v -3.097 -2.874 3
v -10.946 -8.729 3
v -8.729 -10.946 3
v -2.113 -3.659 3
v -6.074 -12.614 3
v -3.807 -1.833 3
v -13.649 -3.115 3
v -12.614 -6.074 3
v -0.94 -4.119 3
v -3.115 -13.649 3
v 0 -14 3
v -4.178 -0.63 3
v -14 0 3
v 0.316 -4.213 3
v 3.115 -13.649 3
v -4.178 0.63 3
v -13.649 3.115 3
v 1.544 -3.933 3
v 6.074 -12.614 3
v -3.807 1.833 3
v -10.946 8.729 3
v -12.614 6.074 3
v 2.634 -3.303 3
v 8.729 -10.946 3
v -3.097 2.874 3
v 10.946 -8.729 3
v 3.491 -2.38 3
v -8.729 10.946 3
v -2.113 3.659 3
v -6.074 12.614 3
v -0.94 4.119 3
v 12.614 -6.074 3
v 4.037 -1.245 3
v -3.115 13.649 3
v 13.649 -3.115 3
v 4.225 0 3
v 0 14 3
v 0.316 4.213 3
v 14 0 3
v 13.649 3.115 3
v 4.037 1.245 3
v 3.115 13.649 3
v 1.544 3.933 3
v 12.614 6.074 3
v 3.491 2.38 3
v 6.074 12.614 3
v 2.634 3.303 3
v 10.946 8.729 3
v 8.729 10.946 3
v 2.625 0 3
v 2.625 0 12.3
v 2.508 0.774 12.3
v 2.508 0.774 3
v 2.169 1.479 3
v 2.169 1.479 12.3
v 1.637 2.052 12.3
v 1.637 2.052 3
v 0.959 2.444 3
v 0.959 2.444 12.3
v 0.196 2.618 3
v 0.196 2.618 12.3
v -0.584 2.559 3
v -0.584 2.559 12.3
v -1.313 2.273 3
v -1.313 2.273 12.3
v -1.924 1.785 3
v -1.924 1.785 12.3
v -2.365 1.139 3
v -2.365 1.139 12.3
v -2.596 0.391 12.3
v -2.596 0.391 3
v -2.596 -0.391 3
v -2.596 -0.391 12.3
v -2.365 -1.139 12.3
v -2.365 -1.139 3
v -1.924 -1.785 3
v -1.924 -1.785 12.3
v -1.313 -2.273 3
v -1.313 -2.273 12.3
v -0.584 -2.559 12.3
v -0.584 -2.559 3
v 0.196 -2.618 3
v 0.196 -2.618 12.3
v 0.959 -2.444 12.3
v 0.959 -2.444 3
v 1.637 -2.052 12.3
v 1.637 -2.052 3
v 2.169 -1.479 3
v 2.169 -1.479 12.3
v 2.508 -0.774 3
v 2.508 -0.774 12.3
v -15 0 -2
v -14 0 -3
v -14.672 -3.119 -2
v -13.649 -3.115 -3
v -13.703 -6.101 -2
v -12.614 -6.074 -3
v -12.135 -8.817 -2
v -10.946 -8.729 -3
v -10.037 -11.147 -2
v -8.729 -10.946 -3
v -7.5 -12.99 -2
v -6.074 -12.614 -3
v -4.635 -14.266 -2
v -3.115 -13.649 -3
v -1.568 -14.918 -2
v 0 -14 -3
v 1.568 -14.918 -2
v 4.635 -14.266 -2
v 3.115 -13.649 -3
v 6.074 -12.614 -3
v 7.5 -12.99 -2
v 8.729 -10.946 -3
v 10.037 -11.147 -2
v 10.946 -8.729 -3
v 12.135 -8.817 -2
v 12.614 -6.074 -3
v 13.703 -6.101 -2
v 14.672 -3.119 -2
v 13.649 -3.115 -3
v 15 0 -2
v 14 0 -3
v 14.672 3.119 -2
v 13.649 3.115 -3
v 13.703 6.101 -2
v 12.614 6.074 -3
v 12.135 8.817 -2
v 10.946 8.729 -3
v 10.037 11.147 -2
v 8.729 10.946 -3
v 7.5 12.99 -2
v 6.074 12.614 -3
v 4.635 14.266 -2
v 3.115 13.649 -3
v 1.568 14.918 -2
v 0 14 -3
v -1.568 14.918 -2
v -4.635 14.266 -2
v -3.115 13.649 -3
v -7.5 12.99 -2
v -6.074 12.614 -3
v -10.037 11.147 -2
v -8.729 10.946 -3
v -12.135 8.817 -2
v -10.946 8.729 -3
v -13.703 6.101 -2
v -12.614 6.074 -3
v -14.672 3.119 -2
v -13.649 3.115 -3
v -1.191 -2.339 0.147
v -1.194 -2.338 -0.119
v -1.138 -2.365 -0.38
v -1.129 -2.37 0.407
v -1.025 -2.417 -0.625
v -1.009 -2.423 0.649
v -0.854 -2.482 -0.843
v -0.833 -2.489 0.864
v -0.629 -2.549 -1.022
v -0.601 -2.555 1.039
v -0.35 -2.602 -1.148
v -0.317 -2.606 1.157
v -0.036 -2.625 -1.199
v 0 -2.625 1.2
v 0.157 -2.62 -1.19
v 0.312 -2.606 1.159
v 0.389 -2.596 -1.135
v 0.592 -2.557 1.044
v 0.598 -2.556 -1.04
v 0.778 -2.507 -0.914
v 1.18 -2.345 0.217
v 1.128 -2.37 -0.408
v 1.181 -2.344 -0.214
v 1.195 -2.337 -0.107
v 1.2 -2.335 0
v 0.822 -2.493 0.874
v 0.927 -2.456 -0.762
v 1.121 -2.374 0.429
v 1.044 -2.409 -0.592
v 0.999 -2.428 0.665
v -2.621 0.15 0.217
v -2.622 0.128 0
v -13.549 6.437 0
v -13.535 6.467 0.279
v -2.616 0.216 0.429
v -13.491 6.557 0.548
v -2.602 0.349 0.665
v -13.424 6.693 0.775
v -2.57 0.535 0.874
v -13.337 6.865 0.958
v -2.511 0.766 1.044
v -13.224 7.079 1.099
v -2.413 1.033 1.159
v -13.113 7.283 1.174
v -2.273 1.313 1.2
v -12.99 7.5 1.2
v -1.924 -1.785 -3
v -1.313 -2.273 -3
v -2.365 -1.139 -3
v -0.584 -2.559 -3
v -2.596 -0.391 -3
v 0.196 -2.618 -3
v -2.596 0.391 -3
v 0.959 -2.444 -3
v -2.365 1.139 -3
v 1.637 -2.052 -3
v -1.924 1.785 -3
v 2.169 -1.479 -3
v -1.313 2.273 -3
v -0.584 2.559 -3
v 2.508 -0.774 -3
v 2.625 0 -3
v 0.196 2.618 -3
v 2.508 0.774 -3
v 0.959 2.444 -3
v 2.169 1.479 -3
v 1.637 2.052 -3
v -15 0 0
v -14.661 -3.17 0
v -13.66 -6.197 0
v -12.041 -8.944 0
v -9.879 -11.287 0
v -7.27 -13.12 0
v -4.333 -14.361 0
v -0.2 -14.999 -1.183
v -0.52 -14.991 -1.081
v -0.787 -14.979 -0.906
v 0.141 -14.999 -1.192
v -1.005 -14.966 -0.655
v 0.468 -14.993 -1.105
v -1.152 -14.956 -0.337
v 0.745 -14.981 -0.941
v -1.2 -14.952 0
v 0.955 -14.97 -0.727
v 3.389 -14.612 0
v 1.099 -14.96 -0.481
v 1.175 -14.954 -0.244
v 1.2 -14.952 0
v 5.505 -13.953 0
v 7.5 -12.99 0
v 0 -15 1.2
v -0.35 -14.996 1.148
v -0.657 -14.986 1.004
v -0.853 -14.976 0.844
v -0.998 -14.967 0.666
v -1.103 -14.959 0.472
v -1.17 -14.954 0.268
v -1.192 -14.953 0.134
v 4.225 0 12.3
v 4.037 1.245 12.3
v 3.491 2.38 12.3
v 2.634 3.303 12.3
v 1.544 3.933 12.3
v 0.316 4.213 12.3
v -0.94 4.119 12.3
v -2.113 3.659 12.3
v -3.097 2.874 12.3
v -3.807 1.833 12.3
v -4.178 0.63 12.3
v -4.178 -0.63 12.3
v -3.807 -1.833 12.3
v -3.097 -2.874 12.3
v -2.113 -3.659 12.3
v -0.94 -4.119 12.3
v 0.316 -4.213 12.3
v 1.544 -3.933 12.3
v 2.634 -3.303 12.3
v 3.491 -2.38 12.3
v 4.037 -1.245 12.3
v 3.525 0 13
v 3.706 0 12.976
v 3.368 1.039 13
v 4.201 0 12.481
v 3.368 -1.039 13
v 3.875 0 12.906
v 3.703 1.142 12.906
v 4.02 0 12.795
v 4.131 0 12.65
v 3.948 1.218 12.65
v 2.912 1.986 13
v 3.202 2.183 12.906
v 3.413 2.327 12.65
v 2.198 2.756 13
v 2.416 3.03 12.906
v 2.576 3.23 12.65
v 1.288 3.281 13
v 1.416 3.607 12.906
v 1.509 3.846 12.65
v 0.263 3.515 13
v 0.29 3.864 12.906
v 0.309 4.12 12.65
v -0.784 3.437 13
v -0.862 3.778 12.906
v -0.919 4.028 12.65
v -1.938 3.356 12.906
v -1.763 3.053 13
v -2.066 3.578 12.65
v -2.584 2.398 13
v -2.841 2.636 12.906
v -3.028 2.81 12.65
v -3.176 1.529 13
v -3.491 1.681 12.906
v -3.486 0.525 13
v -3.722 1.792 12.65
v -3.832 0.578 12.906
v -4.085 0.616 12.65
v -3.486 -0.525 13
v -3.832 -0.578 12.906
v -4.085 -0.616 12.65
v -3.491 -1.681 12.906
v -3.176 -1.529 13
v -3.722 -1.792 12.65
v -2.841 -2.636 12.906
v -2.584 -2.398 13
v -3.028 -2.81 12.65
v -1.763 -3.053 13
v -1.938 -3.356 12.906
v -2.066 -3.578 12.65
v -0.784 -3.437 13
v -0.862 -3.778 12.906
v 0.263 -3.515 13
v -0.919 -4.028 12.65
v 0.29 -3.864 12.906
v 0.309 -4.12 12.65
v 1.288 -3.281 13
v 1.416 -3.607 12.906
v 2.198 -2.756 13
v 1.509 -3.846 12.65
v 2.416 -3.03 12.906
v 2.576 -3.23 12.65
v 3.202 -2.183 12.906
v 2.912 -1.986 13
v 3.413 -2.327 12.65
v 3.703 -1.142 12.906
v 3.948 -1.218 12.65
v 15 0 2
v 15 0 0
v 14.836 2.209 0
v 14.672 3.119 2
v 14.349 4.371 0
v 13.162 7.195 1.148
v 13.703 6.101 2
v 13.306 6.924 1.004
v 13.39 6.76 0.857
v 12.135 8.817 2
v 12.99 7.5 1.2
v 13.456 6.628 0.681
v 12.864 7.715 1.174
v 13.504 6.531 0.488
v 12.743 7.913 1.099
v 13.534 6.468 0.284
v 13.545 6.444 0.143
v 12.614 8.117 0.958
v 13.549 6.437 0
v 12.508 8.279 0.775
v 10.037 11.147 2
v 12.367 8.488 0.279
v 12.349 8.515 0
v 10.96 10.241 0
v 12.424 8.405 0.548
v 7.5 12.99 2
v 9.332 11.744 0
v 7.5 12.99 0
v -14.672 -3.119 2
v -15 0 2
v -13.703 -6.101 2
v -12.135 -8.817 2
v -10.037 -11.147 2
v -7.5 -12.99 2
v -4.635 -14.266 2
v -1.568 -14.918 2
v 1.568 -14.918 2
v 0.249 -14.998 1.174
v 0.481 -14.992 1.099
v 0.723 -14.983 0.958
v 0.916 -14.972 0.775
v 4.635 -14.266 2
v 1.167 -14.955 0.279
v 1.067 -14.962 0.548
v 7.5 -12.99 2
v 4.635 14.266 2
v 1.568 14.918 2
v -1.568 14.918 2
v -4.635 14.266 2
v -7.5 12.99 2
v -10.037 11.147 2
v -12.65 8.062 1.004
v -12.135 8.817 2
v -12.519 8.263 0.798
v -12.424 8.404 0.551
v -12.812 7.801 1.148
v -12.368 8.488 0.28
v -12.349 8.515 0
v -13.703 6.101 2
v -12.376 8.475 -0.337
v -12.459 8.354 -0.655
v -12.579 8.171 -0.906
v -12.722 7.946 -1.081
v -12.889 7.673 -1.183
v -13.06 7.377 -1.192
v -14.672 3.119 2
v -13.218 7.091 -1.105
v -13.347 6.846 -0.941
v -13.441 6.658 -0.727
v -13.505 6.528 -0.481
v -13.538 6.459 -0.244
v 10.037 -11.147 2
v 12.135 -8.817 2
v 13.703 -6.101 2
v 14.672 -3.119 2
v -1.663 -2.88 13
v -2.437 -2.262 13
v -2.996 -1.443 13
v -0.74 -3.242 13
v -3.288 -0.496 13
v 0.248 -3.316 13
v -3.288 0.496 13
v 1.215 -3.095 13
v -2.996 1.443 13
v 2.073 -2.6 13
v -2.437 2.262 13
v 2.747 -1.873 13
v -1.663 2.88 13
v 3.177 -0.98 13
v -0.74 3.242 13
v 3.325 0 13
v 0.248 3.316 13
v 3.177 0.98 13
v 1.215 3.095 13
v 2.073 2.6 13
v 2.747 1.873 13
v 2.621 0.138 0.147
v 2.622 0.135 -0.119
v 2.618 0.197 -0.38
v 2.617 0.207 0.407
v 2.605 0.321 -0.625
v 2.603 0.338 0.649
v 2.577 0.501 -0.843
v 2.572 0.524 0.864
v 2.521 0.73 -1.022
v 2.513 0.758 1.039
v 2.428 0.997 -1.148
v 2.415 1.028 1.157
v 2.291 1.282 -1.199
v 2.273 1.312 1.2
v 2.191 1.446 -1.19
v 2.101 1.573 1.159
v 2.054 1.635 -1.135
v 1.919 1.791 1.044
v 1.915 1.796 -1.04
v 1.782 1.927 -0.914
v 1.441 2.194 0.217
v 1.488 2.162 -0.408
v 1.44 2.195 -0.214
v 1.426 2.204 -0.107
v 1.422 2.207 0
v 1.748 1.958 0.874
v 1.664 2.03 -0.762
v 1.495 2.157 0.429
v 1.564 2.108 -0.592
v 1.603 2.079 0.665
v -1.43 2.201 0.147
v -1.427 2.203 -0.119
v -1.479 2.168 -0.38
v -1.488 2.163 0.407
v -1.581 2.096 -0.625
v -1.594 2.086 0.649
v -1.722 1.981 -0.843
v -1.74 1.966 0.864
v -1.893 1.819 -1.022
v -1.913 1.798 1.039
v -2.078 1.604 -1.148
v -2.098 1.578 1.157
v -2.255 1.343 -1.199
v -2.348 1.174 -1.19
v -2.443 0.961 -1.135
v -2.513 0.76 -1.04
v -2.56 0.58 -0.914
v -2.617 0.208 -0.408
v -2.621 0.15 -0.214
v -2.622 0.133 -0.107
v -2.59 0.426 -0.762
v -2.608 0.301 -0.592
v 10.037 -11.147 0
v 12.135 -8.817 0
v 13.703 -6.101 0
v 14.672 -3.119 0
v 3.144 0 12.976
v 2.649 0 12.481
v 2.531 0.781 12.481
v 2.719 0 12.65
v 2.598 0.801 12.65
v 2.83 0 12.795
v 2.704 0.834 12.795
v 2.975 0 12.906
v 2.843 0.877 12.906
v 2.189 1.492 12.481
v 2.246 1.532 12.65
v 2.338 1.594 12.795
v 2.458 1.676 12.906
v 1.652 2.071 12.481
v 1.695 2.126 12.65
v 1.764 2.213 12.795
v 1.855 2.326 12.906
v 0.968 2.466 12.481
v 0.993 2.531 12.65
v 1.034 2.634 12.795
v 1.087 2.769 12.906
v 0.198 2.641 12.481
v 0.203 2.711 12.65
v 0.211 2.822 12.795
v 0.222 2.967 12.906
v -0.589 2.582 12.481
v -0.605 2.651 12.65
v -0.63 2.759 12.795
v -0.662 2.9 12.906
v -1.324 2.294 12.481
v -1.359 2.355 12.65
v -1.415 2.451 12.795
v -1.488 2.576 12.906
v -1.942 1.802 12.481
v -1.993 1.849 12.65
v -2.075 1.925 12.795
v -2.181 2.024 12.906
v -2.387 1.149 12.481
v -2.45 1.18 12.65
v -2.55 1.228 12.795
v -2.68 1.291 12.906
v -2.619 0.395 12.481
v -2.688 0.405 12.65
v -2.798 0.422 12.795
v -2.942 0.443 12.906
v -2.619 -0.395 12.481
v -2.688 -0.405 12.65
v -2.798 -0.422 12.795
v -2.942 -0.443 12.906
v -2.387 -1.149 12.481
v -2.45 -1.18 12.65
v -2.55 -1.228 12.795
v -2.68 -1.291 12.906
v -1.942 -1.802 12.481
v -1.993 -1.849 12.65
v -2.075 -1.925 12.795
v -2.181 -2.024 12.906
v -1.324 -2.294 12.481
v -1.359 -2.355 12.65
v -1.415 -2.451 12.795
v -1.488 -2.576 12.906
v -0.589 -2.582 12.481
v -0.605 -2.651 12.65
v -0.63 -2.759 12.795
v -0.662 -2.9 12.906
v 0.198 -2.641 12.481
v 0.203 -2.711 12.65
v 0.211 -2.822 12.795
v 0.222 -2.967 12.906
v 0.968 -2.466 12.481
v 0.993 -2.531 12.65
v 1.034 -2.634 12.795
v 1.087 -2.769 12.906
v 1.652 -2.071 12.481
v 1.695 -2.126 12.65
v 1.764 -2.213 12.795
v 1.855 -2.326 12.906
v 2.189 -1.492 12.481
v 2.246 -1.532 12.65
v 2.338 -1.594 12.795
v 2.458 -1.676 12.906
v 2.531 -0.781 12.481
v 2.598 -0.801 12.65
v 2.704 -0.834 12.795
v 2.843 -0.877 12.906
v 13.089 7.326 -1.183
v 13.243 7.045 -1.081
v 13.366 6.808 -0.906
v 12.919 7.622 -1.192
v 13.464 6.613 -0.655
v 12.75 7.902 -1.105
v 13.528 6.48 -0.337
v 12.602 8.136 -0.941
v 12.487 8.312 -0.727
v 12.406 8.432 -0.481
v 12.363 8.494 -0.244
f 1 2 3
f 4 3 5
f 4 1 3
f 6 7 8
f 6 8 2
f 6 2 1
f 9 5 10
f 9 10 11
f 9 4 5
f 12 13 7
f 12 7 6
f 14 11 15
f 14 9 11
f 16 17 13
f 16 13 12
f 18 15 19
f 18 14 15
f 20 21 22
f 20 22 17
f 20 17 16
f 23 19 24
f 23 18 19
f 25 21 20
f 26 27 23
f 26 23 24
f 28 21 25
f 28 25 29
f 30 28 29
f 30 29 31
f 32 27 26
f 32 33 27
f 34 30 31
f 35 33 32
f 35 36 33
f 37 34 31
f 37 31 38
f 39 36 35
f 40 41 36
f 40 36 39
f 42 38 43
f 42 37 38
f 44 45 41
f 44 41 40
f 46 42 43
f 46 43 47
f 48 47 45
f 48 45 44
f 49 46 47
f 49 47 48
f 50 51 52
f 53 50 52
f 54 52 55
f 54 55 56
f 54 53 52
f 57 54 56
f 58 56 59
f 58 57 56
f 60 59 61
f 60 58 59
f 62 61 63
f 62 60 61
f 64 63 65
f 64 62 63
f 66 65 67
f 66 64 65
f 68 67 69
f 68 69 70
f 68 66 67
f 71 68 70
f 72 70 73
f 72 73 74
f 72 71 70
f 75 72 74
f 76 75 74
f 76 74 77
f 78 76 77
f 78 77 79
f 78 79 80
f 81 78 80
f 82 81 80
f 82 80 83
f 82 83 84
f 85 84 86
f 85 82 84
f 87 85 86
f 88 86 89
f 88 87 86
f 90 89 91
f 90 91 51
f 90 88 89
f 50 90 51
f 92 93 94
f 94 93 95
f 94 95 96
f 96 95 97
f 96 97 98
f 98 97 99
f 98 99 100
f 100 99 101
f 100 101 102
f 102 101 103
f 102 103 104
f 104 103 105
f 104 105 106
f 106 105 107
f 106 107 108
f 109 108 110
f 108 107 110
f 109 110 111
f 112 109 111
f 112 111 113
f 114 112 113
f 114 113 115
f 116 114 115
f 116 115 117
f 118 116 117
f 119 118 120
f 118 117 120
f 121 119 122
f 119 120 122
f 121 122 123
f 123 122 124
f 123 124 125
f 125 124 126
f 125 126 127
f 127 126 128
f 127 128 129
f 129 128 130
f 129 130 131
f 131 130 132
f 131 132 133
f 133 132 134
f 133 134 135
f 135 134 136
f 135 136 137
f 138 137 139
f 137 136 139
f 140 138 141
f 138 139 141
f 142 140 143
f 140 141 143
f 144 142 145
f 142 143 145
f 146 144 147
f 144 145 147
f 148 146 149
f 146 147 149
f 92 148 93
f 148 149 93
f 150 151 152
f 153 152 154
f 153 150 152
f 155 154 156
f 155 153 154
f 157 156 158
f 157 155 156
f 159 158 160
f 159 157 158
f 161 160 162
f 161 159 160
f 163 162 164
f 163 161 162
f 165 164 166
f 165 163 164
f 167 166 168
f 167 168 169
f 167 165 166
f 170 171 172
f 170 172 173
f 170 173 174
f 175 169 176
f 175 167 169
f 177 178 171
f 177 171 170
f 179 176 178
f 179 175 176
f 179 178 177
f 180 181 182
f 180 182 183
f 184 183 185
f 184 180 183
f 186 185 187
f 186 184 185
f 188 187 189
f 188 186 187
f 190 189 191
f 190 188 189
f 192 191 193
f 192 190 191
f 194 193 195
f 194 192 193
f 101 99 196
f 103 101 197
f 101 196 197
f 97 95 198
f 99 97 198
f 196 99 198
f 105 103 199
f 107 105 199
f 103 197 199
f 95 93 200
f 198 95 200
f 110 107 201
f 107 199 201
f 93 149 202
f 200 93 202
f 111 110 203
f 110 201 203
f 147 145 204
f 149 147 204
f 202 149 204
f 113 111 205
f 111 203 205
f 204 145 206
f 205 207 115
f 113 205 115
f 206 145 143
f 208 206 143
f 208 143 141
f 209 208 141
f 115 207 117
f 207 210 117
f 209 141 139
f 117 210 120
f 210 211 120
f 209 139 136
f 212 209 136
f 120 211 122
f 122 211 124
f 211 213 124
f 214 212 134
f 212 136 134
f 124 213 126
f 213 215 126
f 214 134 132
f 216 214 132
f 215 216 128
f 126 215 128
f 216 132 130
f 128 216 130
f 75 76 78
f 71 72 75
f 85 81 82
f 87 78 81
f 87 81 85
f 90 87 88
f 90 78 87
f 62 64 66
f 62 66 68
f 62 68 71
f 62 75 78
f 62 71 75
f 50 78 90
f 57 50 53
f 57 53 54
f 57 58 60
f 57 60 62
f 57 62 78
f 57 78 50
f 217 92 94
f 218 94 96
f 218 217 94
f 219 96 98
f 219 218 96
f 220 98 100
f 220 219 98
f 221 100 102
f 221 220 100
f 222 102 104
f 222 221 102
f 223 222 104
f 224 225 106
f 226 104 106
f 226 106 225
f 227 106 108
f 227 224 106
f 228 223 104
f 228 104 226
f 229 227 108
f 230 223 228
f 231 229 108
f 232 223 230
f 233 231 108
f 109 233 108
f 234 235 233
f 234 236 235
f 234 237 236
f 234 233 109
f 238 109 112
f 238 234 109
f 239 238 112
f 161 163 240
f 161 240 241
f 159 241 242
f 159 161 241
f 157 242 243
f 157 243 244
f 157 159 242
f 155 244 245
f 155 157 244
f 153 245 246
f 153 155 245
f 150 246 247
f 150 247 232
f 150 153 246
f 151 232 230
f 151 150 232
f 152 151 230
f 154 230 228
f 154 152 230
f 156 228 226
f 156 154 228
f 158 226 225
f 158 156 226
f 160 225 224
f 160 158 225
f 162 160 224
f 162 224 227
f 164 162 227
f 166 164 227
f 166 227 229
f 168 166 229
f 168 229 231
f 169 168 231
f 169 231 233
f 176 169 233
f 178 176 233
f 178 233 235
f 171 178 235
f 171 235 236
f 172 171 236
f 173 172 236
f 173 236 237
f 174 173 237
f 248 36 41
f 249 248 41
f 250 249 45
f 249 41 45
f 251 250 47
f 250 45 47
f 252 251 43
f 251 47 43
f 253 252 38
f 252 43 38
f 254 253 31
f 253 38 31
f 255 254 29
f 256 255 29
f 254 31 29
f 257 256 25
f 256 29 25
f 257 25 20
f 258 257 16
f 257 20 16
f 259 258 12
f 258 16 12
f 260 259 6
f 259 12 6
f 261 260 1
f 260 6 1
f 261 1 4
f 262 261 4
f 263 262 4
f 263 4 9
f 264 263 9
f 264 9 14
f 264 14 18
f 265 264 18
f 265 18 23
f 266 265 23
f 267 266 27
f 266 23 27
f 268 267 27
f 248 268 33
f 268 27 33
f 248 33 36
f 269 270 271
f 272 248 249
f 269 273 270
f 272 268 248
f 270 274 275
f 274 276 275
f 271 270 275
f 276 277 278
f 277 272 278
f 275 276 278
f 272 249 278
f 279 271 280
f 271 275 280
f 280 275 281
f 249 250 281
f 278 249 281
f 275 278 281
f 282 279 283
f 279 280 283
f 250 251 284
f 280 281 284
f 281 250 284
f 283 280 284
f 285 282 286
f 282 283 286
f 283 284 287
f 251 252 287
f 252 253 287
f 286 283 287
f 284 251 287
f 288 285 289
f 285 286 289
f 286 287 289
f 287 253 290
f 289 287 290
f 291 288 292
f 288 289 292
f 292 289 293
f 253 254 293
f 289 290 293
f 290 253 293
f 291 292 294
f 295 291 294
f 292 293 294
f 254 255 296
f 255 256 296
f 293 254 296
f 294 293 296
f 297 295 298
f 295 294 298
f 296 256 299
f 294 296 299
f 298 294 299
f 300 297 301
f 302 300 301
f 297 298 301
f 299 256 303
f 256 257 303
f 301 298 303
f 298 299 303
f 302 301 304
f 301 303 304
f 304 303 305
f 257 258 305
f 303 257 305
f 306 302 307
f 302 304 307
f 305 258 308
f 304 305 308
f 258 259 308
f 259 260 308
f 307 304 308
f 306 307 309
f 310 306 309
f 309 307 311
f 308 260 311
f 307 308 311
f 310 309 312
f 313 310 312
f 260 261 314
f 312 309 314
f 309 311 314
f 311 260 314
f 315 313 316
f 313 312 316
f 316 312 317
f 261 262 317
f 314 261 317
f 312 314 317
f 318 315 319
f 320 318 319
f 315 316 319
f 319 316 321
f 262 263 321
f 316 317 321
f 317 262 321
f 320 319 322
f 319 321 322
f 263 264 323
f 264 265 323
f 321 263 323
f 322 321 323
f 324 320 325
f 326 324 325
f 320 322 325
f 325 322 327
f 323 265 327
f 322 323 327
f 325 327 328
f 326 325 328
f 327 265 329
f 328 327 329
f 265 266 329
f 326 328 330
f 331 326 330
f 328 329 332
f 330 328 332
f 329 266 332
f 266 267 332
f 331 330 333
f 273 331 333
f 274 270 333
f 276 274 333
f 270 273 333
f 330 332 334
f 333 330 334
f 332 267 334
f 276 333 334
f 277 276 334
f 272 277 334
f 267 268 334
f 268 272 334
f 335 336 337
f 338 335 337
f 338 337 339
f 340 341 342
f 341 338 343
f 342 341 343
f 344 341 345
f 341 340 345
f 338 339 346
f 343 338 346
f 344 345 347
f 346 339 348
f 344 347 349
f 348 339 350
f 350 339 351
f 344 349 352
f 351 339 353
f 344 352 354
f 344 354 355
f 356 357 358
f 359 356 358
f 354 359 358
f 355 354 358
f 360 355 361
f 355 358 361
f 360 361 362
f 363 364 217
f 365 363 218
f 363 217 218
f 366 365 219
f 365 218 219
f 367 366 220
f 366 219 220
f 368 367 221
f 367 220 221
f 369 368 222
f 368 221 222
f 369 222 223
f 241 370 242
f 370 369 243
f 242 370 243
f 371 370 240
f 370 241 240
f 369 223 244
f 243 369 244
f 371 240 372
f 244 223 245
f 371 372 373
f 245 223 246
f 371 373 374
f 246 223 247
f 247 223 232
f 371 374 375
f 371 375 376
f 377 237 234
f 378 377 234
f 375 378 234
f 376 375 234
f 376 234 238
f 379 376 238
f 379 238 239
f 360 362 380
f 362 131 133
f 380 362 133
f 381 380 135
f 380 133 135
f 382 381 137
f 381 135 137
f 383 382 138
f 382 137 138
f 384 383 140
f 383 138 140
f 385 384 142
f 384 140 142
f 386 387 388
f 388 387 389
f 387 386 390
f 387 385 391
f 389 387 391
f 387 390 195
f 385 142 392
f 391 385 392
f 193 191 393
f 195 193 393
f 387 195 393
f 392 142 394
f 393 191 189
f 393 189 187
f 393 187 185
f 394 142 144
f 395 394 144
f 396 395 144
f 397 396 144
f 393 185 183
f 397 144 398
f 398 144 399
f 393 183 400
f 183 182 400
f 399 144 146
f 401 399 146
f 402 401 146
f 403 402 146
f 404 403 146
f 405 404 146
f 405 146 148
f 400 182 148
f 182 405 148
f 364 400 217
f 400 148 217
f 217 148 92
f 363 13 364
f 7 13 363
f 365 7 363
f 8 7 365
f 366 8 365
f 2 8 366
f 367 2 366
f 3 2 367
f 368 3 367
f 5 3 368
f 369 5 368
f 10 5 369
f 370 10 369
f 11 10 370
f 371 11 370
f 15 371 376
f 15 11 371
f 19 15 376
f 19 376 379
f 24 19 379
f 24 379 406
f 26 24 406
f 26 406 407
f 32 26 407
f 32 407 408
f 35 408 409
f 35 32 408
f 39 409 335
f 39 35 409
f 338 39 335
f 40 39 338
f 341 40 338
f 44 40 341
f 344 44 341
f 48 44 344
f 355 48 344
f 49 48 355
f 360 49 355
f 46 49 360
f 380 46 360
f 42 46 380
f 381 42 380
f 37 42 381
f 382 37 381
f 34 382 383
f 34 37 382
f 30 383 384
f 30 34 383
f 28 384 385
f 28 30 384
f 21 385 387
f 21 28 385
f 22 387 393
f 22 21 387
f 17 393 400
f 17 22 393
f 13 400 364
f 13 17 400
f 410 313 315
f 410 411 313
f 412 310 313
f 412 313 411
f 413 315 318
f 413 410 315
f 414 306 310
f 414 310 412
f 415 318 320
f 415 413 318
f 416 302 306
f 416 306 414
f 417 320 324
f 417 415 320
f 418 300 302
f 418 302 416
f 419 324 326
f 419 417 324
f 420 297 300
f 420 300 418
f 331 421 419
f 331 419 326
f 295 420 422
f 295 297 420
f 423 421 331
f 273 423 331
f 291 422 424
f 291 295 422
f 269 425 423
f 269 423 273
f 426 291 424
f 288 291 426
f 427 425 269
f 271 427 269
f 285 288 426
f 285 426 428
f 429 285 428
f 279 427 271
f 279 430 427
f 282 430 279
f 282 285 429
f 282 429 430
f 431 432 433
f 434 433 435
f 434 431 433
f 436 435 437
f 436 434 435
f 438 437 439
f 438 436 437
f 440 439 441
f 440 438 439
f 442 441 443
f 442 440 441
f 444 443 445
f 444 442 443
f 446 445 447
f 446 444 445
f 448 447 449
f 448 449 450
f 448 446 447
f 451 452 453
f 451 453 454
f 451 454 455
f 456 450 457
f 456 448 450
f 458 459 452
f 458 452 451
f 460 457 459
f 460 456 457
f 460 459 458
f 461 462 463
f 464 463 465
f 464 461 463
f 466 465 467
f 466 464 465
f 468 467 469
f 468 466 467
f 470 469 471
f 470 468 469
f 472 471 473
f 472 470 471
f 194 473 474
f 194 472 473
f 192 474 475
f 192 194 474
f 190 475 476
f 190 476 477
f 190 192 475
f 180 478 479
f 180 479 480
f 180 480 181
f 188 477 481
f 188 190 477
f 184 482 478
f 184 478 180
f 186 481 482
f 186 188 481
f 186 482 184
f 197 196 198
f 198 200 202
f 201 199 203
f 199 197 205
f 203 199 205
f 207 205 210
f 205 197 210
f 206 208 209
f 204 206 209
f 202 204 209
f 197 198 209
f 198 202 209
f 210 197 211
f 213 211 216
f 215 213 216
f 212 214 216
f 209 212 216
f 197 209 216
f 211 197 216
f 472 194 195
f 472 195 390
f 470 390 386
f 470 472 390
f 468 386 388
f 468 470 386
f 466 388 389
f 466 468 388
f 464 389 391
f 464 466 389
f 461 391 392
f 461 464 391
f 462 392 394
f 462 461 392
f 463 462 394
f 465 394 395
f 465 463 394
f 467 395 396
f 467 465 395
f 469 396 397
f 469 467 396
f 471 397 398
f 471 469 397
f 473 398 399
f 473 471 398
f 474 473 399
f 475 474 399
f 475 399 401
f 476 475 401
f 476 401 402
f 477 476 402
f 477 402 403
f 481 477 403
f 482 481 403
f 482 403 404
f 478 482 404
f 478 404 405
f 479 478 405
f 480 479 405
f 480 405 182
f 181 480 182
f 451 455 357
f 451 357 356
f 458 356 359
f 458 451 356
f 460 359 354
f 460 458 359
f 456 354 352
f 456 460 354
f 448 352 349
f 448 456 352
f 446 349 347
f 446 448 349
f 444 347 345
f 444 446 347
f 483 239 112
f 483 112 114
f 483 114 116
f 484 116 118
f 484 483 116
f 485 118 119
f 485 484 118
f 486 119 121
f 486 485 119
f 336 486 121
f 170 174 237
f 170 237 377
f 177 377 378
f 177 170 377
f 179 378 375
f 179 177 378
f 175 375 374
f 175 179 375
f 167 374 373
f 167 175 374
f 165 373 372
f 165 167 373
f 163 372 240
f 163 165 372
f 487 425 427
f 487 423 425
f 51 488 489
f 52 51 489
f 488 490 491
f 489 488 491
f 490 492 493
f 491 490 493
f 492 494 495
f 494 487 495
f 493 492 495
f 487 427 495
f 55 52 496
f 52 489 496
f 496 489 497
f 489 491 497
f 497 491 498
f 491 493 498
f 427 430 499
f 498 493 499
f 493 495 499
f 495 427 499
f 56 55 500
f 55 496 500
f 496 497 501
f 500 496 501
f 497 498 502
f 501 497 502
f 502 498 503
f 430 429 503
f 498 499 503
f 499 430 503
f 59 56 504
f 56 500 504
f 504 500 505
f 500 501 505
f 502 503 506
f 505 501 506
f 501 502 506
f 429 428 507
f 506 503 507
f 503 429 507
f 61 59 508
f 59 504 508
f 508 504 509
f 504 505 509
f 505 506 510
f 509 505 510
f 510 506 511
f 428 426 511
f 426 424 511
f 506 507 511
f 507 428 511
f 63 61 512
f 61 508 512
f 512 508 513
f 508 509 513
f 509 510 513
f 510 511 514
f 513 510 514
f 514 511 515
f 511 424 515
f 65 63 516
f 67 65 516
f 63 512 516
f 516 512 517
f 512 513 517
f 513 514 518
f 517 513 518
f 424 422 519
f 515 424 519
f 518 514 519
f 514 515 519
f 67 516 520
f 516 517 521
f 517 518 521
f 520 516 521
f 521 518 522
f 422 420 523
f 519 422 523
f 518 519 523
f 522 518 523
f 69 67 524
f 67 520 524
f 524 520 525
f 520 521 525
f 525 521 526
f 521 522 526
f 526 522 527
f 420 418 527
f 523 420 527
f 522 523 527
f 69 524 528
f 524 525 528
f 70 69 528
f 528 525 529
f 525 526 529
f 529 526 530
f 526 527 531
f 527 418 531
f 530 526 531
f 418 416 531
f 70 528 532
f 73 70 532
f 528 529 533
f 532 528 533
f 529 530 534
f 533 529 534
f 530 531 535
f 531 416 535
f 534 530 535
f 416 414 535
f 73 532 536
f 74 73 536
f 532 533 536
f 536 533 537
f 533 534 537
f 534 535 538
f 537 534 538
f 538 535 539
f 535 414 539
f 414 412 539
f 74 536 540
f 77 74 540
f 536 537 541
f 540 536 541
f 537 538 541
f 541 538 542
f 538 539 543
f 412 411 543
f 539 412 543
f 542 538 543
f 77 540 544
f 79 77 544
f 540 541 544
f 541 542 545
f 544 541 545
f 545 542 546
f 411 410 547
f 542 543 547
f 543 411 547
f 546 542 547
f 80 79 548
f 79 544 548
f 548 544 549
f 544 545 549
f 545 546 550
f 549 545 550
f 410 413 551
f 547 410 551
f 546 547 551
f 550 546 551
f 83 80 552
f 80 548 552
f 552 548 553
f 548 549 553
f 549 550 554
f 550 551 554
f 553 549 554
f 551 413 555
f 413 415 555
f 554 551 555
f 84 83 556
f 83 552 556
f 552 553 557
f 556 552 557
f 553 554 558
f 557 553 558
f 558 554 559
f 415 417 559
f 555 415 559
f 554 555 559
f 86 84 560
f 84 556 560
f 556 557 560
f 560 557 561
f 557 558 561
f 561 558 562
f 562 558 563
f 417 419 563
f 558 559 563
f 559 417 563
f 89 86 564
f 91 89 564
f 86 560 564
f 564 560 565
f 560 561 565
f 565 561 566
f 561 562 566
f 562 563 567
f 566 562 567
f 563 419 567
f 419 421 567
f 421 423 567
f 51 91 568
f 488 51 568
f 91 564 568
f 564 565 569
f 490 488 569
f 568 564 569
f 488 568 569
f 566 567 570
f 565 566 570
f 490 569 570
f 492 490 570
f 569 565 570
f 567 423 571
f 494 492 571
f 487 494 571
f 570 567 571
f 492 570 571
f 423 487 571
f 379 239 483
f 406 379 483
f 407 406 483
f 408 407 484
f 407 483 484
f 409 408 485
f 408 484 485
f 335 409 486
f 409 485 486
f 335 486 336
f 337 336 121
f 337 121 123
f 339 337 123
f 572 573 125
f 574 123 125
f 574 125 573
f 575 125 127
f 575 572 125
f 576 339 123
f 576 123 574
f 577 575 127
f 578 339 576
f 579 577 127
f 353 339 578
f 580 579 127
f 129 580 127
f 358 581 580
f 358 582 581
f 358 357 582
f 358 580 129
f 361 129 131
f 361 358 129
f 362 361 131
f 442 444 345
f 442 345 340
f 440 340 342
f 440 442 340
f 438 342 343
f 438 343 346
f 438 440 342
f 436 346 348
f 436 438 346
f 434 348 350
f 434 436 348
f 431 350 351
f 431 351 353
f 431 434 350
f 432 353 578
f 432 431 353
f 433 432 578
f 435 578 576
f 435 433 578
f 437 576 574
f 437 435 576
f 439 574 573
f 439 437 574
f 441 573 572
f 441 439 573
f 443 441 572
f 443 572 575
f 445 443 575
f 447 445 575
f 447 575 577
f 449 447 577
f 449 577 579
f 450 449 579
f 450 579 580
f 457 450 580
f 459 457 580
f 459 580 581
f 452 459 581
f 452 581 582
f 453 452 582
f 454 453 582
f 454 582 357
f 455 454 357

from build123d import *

# Parameters (mm, degrees)
F2_DEPTH = 25
F3_COUNT = 3
F4_DEPTH = 3
F6_R     = 4.225
F6_R_2   = 2.625
F7_DEPTH = 10
F9_DEPTH = 6
F10_R    = 0.7


# Not quite as in the source:
# - a fillet or chamfer that OpenCascade refuses, or shapes differently, is made with other operations: its cross-section is extruded or revolved along the edge and cut away or added


with BuildPart() as f2:
    # F1 (on Front) → F2 (new body)
    with BuildSketch(Plane.XZ):
        with BuildLine():
            ThreePointArc((0, 1.2), (-0.8485281374, -0.8485281374), (1.2, 0))
            ThreePointArc((1.2, 0), (0.8485281374, 0.8485281374), (0, 1.2))
        make_face()
    extrude(amount=F2_DEPTH)

    # F3: F2 ×3 about axis
    f3_axis = Axis((0, 0, 16.2680745125), (0, 0, 1))


with BuildPart() as f2_1:
    add(f2.part)
    for i in range(1, F3_COUNT):
        add(f2.part.rotate(f3_axis, i * 360 / F3_COUNT))


with BuildPart() as f4:
    # F0 (on Top) → F4 (new body, symmetric)
    with BuildSketch(Plane.XY):
        with BuildLine():
            Line((0, 0), (7.5, 12.9903810568))
            ThreePointArc((7.5, 12.9903810568), (-7.5, 12.9903810568), (-15, 0))
            Line((-15, 0), (0, 0))
        make_face()
        with BuildLine():
            ThreePointArc((-15, 0), (-7.5, -12.9903810568), (7.5, -12.9903810568))
            Line((7.5, -12.9903810568), (0, 0))
            Line((0, 0), (-15, 0))
        make_face()
        with BuildLine():
            ThreePointArc((7.5, -12.9903810568), (12.9903810568, -7.5), (15, 0))
            ThreePointArc((15, 0), (12.9903810568, 7.5), (7.5, 12.9903810568))
            Line((7.5, 12.9903810568), (0, 0))
            Line((0, 0), (7.5, -12.9903810568))
        make_face()
        with BuildLine():
            Line((0, 0), (7.5, 12.9903810568))
            ThreePointArc((7.5, 12.9903810568), (-7.5, 12.9903810568), (-15, 0))
            Line((-15, 0), (0, 0))
        make_face()
        with BuildLine():
            ThreePointArc((-15, 0), (-7.5, -12.9903810568), (7.5, -12.9903810568))
            Line((7.5, -12.9903810568), (0, 0))
            Line((0, 0), (-15, 0))
        make_face()
        with BuildLine():
            ThreePointArc((7.5, -12.9903810568), (12.9903810568, -7.5), (15, 0))
            ThreePointArc((15, 0), (12.9903810568, 7.5), (7.5, 12.9903810568))
            Line((7.5, 12.9903810568), (0, 0))
            Line((0, 0), (7.5, -12.9903810568))
        make_face()
    extrude(amount=F4_DEPTH, both=True)

    # F5: cut F2
    add(f2_1.part, mode=Mode.SUBTRACT)

    # F6 (on face) → F7 (join)
    with BuildSketch(Plane.XY.offset(3)):
        Circle(F6_R)
        Circle(F6_R_2, mode=Mode.SUBTRACT)
    extrude(amount=F7_DEPTH)

    # F8: chamfer of 1 on 2 edges, made by hand

    # F8_s1 → F8_t2 (revolve, cut)
    with BuildSketch(Plane.XZ):
        Polygon((-15, 2), (-14, 3), (-15, 3), align=None)
    revolve(axis=Axis((0, 0, 3), (0, 0, 1)), mode=Mode.SUBTRACT)

    # F8_s3 → F8_t4 (revolve, cut)
    with BuildSketch(Plane.XZ):
        Polygon((-15, -2), (-14, -3), (-15, -3), align=None)
    revolve(axis=Axis((0, 0, -3), (0, 0, 1)), mode=Mode.SUBTRACT)

    # F9 (add): a face of the model
    f9_faces = [f4.faces().sort_by_distance(p)[0] for p in [
        (0, 0, 3),
    ]]
    extrude(f9_faces, amount=-F9_DEPTH)

    # F10
    f10_edges = [f4.edges().sort_by_distance(p)[0] for p in [
        (-2.625, 0, 13),
        (-4.225, 0, 13),
    ]]
    fillet(f10_edges, radius=F10_R)


solid = f4.part
